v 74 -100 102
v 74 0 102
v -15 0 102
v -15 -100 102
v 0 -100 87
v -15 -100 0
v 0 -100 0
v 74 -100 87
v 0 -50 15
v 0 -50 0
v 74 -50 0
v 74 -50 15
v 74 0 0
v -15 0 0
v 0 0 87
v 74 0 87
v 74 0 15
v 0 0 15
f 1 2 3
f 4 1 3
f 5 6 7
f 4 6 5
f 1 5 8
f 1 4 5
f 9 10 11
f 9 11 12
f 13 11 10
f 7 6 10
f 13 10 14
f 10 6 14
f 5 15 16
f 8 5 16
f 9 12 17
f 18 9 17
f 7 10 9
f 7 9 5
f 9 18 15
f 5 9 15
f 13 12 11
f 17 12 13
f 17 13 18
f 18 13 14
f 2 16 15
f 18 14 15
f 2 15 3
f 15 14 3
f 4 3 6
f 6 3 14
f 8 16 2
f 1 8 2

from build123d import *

# Parameters (mm, degrees)
F1_DEPTH = 100
F2_W     = 50
F2_H     = 15
F3_DEPTH = 74


with BuildPart() as f1:
    # F0 (on Front) → F1 (new body)
    with BuildSketch(Plane.XZ):
        Polygon((-15, 0), (0, 0), (0, 87), (74, 87), (74, 102), (-15, 102), align=None)
    extrude(amount=F1_DEPTH)

    # F2 (on face) → F3 (join)
    with BuildSketch(Plane.YZ):
        with Locations((-25, 7.5)):
            Rectangle(F2_W, F2_H)
    extrude(amount=F3_DEPTH)


solid = f1.part
